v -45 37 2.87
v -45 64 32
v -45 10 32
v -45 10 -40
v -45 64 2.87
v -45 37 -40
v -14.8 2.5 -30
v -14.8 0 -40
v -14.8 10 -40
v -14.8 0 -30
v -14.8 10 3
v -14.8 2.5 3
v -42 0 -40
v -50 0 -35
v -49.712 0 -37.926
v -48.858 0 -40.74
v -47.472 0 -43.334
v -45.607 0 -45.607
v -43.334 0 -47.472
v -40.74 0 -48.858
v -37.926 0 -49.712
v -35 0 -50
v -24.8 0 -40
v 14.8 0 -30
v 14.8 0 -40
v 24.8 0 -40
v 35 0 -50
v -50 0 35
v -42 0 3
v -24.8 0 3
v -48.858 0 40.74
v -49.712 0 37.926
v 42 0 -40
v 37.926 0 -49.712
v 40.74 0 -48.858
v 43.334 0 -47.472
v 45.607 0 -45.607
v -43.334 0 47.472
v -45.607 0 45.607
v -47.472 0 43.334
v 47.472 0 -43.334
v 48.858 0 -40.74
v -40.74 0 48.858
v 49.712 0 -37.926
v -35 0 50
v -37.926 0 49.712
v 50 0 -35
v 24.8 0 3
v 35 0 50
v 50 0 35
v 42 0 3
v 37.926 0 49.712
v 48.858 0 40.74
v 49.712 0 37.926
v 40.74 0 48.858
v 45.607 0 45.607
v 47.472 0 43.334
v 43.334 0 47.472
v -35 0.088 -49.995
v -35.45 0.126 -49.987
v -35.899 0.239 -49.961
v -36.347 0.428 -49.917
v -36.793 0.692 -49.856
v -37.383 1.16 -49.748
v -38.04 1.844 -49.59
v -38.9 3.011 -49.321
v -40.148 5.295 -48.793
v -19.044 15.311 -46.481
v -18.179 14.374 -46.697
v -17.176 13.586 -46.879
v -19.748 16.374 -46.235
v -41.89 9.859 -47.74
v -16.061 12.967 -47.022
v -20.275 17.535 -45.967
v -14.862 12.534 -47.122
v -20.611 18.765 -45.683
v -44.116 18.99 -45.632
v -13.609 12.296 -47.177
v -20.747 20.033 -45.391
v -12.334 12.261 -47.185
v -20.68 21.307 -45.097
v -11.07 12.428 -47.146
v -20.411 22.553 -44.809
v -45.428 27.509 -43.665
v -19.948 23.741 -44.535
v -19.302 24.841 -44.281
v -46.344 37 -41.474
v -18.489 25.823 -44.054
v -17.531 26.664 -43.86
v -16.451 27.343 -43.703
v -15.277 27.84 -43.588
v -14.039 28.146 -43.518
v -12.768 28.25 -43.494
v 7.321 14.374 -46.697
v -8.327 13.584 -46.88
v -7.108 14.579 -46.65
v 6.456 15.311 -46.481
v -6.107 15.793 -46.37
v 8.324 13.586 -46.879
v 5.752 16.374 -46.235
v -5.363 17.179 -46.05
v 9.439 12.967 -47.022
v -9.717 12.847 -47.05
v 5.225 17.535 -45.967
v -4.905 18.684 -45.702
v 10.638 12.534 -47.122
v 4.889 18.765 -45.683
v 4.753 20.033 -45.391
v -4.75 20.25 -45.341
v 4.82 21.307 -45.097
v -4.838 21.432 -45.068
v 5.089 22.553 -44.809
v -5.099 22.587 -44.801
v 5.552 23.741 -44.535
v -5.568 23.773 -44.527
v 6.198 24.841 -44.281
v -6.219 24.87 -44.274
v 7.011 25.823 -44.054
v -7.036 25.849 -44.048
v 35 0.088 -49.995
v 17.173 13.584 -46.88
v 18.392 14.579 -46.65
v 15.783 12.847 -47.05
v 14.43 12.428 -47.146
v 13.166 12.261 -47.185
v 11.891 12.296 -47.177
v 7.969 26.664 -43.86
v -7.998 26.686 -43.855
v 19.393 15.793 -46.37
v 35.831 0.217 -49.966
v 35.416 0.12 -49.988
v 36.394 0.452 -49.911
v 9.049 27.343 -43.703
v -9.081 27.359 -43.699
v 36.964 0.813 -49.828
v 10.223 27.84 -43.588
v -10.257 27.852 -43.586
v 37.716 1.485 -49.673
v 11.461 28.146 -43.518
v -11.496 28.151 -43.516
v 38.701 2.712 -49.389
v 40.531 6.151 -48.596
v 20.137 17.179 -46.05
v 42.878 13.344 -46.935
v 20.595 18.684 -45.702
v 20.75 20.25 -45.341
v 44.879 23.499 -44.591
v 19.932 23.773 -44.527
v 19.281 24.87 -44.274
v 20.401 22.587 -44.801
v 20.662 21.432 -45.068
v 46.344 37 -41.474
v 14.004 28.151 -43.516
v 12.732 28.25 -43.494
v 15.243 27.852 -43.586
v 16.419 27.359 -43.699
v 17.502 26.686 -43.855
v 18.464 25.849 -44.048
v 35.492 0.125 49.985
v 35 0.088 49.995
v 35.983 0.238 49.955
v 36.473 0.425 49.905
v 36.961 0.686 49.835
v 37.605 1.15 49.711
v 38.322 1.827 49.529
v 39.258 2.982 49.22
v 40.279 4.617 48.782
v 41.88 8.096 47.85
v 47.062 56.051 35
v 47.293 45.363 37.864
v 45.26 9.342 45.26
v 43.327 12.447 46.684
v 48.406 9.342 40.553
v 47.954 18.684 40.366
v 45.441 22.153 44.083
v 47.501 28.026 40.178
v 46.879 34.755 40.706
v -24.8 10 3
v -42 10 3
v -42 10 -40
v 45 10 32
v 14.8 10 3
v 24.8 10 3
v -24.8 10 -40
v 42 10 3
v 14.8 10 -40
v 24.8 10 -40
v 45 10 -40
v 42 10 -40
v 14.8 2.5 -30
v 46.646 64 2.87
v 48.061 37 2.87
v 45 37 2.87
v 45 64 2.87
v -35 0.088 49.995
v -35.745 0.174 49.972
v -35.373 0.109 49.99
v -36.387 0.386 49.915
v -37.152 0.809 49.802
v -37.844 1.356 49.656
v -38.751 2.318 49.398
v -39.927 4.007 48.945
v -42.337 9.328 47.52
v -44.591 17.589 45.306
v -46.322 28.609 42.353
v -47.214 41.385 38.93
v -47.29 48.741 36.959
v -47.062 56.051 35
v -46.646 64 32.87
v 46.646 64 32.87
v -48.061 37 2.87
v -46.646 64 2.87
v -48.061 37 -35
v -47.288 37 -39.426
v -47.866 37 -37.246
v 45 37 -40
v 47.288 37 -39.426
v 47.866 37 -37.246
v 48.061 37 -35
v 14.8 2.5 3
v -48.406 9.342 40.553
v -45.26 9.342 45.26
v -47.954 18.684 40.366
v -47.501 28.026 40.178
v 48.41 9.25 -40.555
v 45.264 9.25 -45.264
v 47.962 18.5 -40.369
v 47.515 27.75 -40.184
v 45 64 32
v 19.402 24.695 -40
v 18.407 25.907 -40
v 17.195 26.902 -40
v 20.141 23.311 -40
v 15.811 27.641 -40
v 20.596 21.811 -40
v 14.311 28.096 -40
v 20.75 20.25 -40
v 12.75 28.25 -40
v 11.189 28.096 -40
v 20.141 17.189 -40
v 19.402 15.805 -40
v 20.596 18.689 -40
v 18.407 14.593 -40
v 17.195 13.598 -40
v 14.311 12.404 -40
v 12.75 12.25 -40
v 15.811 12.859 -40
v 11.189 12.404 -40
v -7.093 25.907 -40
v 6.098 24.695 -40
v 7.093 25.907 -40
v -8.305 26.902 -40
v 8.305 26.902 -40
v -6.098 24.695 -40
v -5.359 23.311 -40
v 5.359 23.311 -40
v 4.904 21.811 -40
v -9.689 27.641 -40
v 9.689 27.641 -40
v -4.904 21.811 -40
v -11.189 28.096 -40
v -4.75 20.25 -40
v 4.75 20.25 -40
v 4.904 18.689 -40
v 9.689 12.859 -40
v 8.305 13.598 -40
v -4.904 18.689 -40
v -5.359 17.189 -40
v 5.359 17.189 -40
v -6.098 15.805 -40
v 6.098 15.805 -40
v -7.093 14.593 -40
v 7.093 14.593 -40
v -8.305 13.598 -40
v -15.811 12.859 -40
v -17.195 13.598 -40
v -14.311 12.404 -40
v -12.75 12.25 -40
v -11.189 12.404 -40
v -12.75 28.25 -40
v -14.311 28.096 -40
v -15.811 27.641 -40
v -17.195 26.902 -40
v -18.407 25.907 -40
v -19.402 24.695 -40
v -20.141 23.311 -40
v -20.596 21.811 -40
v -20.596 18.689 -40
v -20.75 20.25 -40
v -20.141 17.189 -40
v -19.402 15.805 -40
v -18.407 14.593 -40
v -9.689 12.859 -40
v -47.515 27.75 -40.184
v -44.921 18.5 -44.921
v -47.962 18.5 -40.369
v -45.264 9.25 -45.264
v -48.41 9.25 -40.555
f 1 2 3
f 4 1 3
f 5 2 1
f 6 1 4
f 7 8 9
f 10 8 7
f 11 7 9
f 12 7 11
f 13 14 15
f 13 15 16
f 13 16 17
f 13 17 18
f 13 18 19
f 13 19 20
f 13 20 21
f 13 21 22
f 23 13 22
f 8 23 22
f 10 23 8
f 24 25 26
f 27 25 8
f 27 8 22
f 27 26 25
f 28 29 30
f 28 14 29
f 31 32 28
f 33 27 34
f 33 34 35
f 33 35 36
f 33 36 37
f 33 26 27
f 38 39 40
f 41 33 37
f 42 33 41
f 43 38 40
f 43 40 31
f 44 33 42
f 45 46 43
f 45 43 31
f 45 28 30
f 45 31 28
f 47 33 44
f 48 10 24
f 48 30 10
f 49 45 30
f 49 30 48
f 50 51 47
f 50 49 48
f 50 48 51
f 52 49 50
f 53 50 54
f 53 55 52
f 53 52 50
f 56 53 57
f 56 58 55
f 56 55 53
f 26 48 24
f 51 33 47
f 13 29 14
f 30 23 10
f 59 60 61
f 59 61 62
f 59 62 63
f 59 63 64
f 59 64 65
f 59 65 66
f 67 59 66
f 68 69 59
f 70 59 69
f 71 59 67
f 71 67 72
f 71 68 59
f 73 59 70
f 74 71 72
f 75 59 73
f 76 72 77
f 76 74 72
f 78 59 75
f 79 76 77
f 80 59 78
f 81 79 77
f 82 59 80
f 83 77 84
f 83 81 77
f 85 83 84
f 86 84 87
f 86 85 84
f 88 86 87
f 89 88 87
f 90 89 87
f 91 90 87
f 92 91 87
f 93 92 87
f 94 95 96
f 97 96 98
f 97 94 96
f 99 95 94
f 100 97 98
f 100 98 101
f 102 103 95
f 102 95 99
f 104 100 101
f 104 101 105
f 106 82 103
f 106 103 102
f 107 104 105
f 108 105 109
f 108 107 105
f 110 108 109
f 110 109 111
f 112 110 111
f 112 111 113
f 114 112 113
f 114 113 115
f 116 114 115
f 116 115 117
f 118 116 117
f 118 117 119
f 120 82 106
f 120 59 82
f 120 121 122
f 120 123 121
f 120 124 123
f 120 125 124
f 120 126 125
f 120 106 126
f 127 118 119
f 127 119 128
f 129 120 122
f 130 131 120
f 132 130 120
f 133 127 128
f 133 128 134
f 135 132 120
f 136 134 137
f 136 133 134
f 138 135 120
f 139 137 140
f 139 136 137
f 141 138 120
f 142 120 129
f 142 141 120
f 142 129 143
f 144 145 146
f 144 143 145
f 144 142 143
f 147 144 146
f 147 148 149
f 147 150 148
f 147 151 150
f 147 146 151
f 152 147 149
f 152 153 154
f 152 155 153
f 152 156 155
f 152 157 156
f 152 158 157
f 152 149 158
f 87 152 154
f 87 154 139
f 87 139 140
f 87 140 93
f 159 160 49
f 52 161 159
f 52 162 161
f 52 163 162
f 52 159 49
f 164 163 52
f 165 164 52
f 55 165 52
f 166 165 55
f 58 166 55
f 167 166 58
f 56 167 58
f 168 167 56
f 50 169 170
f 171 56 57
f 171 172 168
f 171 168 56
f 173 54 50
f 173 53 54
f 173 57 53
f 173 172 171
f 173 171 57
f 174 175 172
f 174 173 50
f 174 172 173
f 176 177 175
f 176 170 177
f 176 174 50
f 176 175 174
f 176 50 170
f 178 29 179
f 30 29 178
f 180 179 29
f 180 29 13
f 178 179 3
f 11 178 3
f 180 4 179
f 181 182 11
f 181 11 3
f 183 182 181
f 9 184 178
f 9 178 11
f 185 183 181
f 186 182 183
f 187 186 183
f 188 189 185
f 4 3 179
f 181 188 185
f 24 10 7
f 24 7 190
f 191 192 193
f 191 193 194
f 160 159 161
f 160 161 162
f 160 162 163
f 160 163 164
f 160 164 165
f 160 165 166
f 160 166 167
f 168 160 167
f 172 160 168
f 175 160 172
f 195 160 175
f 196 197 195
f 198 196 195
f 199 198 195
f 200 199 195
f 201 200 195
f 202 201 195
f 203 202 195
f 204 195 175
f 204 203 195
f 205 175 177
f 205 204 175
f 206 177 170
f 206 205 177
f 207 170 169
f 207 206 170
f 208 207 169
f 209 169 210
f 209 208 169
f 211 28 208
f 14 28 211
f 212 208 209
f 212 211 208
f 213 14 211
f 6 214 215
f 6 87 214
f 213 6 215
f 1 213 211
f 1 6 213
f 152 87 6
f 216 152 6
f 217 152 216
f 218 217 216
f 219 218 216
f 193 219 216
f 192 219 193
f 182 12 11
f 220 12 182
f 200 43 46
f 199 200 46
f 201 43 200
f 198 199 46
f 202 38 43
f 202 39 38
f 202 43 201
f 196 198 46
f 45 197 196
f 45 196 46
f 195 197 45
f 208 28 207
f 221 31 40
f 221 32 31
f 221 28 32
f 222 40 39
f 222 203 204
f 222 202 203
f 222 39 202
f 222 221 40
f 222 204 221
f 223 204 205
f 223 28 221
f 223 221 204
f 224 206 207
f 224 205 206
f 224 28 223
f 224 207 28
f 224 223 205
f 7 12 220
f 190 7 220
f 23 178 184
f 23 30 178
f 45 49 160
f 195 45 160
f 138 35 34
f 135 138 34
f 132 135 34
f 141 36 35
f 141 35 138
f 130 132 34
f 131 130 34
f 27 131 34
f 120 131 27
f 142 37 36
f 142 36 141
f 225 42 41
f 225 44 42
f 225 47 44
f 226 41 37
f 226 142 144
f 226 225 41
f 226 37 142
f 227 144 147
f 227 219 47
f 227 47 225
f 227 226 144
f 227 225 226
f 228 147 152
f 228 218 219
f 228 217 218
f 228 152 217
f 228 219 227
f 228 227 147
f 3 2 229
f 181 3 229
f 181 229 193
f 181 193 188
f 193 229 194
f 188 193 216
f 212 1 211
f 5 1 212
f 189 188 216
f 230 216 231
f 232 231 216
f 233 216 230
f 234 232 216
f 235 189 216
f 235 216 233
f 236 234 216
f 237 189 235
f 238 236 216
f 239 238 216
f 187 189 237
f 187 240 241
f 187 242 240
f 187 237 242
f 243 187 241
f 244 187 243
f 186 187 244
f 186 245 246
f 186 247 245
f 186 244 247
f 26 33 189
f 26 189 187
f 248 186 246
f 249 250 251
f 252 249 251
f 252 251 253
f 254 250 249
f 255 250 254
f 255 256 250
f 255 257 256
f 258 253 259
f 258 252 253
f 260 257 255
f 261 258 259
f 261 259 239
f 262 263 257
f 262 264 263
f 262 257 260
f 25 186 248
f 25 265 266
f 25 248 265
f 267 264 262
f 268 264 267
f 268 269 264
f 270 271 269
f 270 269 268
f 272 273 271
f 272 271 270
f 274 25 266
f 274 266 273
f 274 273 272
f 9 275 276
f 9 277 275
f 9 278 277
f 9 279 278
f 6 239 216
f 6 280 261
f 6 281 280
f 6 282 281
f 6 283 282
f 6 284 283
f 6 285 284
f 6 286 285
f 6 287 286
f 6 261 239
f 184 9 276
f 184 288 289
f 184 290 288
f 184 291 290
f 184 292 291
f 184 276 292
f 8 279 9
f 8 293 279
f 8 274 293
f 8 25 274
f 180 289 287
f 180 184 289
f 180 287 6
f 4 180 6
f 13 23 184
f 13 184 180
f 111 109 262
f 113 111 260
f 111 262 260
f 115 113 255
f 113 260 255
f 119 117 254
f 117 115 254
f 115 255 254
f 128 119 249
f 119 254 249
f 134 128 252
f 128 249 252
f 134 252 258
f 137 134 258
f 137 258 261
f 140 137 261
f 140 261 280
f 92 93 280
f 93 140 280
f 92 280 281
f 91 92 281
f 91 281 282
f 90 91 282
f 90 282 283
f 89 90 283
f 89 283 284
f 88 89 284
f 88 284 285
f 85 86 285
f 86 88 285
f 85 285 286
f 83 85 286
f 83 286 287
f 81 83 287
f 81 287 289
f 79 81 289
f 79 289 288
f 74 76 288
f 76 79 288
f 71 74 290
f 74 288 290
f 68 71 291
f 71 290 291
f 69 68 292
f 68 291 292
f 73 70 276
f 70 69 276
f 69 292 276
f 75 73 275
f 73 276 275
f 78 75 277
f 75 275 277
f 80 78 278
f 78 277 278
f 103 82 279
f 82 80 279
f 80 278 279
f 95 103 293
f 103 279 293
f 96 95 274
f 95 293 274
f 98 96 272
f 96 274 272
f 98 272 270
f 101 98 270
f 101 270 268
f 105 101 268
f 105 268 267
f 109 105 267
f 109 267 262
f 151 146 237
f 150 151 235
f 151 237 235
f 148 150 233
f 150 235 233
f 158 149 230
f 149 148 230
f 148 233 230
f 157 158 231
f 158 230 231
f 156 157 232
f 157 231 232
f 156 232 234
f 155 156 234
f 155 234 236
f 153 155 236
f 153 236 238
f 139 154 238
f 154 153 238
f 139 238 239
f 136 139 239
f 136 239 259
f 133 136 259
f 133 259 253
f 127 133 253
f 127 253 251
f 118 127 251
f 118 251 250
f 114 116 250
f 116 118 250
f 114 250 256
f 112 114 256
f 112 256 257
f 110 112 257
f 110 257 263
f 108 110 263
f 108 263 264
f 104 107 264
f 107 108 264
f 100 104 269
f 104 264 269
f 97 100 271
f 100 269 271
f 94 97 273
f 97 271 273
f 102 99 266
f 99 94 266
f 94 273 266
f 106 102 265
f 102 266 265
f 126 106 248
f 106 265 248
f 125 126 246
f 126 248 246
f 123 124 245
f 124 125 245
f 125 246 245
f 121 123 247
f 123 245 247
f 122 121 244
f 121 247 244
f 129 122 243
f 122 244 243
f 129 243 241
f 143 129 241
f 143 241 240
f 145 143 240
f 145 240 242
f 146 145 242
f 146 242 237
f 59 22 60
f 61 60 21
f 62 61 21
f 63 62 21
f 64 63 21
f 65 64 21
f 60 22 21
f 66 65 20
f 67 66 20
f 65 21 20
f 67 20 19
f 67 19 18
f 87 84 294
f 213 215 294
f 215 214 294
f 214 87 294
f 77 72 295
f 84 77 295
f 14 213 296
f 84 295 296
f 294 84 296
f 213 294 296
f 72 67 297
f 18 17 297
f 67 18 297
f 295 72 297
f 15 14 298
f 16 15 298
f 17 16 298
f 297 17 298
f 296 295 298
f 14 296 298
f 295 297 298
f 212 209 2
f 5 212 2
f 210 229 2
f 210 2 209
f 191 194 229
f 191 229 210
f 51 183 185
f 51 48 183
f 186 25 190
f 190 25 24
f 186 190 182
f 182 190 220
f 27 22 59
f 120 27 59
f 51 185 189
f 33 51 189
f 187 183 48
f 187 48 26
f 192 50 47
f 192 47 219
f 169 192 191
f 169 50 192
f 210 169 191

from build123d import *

# Parameters (mm, degrees)
BOSS_EXTRUDE1_DEPTH     = 10
SKETCH2_W               = 17.2
SKETCH2_H               = 43
CUT_EXTRUDE1_DEPTH      = 72.414284285
SKETCH3_W               = 90
SKETCH3_H               = 34
SKETCH3_W_2             = 80
SKETCH3_H_2             = 24
BOSS_EXTRUDE3_DEPTH     = 15
SKETCH4_W               = 49.6
SKETCH4_H               = 5
BOSS_EXTRUDE4_DEPTH     = 10
SKETCH5_W               = 15
SKETCH5_H               = 22
BOSS_EXTRUDE5_DEPTH     = 5
SKETCH6_W               = 90
SKETCH6_H               = 77
BOSS_EXTRUDE6_DEPTH     = 15
BOSS_EXTRUDE8_DEPTH     = 39
CHAMFER1_SIZE           = 64
CHAMFER1_SIZE_2         = 3.354097874
CHAMFER2_SIZE           = 64
CHAMFER2_SIZE_2         = 11.405813635
CHAMFER3_SIZE           = 64
CHAMFER3_SIZE_2         = 13.775745352
CUT_EXTRUDE3_DEPTH      = 95.500525601
CUT_EXTRUDE3_DEPTH_BACK = 95.500525601
SKETCH10_W              = 50
SKETCH10_H              = 27
SKETCH15_R              = 8
CUT_EXTRUDE5_DEPTH      = 122.227059686
CUT_EXTRUDE6_DEPTH      = 2.5
SKETCH18_W              = 29.6
SKETCH18_H              = 43
CUT_EXTRUDE7_DEPTH      = 10
CUT_EXTRUDE8_DEPTH      = 15
SKETCH21_W              = 29.6
SKETCH21_H              = 33
BOSS_EXTRUDE10_DEPTH    = 2.5
SKETCH23_W              = 2.05
SKETCH23_H              = 13
BOSS_EXTRUDE11_DEPTH    = 15
SKETCH24_W              = 90
SKETCH24_H              = 72
CUT_EXTRUDE9_DEPTH      = 54


with BuildPart() as part:
    # Sketch1 → Boss-Extrude1 (new body)
    with BuildSketch(Plane(origin=(0, 0, 0), x_dir=(1, 0, 0), z_dir=(0, 1, 0))):
        with BuildLine():
            Line((-35, 50), (35, 50))
            ThreePointArc((35, 50), (45.606601718, 45.606601718), (50, 35))
            Line((50, 35), (50, -35))
            ThreePointArc((50, -35), (45.606601718, -45.606601718), (35, -50))
            Line((35, -50), (-35, -50))
            ThreePointArc((-35, -50), (-45.606601718, -45.606601718), (-50, -35))
            Line((-50, -35), (-50, 35))
            ThreePointArc((-50, 35), (-45.606601718, 45.606601718), (-35, 50))
        make_face()
    extrude(amount=BOSS_EXTRUDE1_DEPTH)

    # Sketch2 → Cut-Extrude1 (cut, through all)
    with BuildSketch(Plane(origin=(0, 10, 0), x_dir=(1, 0, 0), z_dir=(0, 1, 0))):
        with Locations((-33.4, 18.5)):
            Rectangle(SKETCH2_W, SKETCH2_H)
        with Locations((33.4, 18.5)):
            Rectangle(SKETCH2_W, SKETCH2_H)
    extrude(amount=-CUT_EXTRUDE1_DEPTH, mode=Mode.SUBTRACT)

    # Sketch3 → Boss-Extrude3 (add)
    with BuildSketch(Plane(origin=(0, 10, 0), x_dir=(1, 0, 0), z_dir=(0, 1, 0))):
        with Locations((0, -20)):
            Rectangle(SKETCH3_W, SKETCH3_H)
        with Locations((0, -20)):
            Rectangle(SKETCH3_W_2, SKETCH3_H_2, mode=Mode.SUBTRACT)
    extrude(amount=BOSS_EXTRUDE3_DEPTH)

    # Sketch4 → Boss-Extrude4 (add)
    with BuildSketch(Plane(origin=(0, 10, 0), x_dir=(1, 0, 0), z_dir=(0, 1, 0))):
        with Locations((0, 10)):
            Rectangle(SKETCH4_W, SKETCH4_H)
        with Locations((0, 27)):
            Rectangle(SKETCH4_W, SKETCH4_H)
    extrude(amount=BOSS_EXTRUDE4_DEPTH)

    # Sketch5 → Boss-Extrude5 (add)
    with BuildSketch(Plane(origin=(0, 20, 0), x_dir=(1, 0, 0), z_dir=(0, 1, 0))):
        with Locations((-17.3, 18.5)):
            Rectangle(SKETCH5_W, SKETCH5_H)
        with Locations((17.3, 18.5)):
            Rectangle(SKETCH5_W, SKETCH5_H)
    extrude(amount=BOSS_EXTRUDE5_DEPTH)

    # Sketch6 → Boss-Extrude6 (add)
    with BuildSketch(Plane(origin=(0, 10, 0), x_dir=(1, 0, 0), z_dir=(0, 1, 0))):
        with BuildLine():
            Line((-50, 35), (-50, -35))
            ThreePointArc((-50, -35), (-45.606601718, -45.606601718), (-35, -50))
            Line((-35, -50), (35, -50))
            ThreePointArc((35, -50), (45.606601718, -45.606601718), (50, -35))
            Line((50, -35), (50, 35))
            ThreePointArc((50, 35), (45.606601718, 45.606601718), (35, 50))
            Line((35, 50), (-35, 50))
            ThreePointArc((-35, 50), (-45.606601718, 45.606601718), (-50, 35))
        make_face()
        with Locations((0, 1.5)):
            Rectangle(SKETCH6_W, SKETCH6_H, mode=Mode.SUBTRACT)
    extrude(amount=BOSS_EXTRUDE6_DEPTH)

    # Sketch9 → Boss-Extrude8 (add)
    with BuildSketch(Plane(origin=(0, 25, 0), x_dir=(1, 0, 0), z_dir=(0, 1, 0))):
        with BuildLine():
            Line((-50, 35), (-50, -35))
            ThreePointArc((-50, -35), (-45.606601718, -45.606601718), (-35, -50))
            Line((-35, -50), (35, -50))
            ThreePointArc((35, -50), (45.606601718, -45.606601718), (50, -35))
            Line((50, -35), (50, 35))
            ThreePointArc((50, 35), (45.606601718, 45.606601718), (35, 50))
            Line((35, 50), (-35, 50))
            ThreePointArc((-35, 50), (-45.606601718, 45.606601718), (-50, 35))
        make_face()
        with BuildLine():
            Line((-45, 35), (-45, -32))
            Line((-45, -32), (45, -32))
            Line((45, -32), (45, 35))
            ThreePointArc((45, 35), (44.659258263, 37.588190451), (43.660254038, 40))
            Line((43.660254038, 40), (-43.660254038, 40))
            ThreePointArc((-43.660254038, 40), (-44.659258263, 37.588190451), (-45, 35))
        make_face(mode=Mode.SUBTRACT)
    extrude(amount=BOSS_EXTRUDE8_DEPTH)

    # Chamfer1
    # the kernel refuses this chamfer: 64, 3.354097874 mm, written as the material it takes off along each edge
    with BuildSketch(Plane(origin=(-35, 64, 50), x_dir=(0, -0.9999979738662979, 0.002013023422382214), z_dir=(1, 0, 0)), Plane(origin=(50, 64, 35), x_dir=(0.002013023422382214, -0.9999979738662979, 0), z_dir=(0, 0, -1)), Plane(origin=(-50, 64, -35), x_dir=(-0.002013023422382214, -0.9999979738662979, 0), z_dir=(0, 0, 1)), Plane(origin=(35, 64, -50), x_dir=(0, -0.9999979738662979, -0.002013023422382214), z_dir=(-1, 0, 0))) as chamfer1_piece_1:
        Polygon((CHAMFER1_SIZE * 0.999997973866, CHAMFER1_SIZE * 0.00201302342238), (-CHAMFER1_SIZE_2 * 0.00201302342245, CHAMFER1_SIZE_2 * 0.9999979739), (0, 0), align=None)
    extrude(amount=70, mode=Mode.SUBTRACT)
    with BuildSketch(Plane(origin=(35, 64, 35), x_dir=(0, 0, 1), z_dir=(-1, 0, 0))) as chamfer1_piece_2:
        Polygon((15, -CHAMFER1_SIZE), (15 - CHAMFER1_SIZE_2, 0), (15, 0), align=None)
    revolve(axis=Axis((35, 64, 35), (0, 1, 0)), revolution_arc=90, mode=Mode.SUBTRACT)
    with BuildSketch(Plane(origin=(-35, 64, 35), x_dir=(-1, 0, 0), z_dir=(0, 0, -1))) as chamfer1_piece_3:
        Polygon((15, -CHAMFER1_SIZE), (15 - CHAMFER1_SIZE_2, 0), (15, 0), align=None)
    revolve(axis=Axis((-35, 64, 35), (0, 1, 0)), revolution_arc=90, mode=Mode.SUBTRACT)
    with BuildSketch(Plane(origin=(35, 64, -35), x_dir=(1, 0, 0), z_dir=(0, 0, 1))) as chamfer1_piece_4:
        Polygon((15, -CHAMFER1_SIZE), (15 - CHAMFER1_SIZE_2, 0), (15, 0), align=None)
    revolve(axis=Axis((35, 64, -35), (0, 1, 0)), revolution_arc=90, mode=Mode.SUBTRACT)
    with BuildSketch(Plane(origin=(-35, 64, -35), x_dir=(0, 0, -1), z_dir=(1, 0, 0))) as chamfer1_piece_5:
        Polygon((15 - CHAMFER1_SIZE_2, 0), (15, -CHAMFER1_SIZE), (15, 0), align=None)
    revolve(axis=Axis((-35, 64, -35), (0, 1, 0)), revolution_arc=90, mode=Mode.SUBTRACT)

    # Chamfer2
    # the kernel refuses this chamfer: 64, 11.405813635 mm, written as the material it takes off along each edge
    with BuildSketch(Plane(origin=(201.306482971, 64, -46.645902126), x_dir=(0, -0.9982575003065525, -0.05900816114499234), z_dir=(-1, 0, 0))) as chamfer2_piece_1:
        Polygon((CHAMFER2_SIZE * 0.999977671636, CHAMFER2_SIZE * 0.0066825316561), (-CHAMFER2_SIZE_2 * 0.0590081611462, CHAMFER2_SIZE_2 * 0.998257500326), (0, 0), align=None)
    extrude(amount=402.612965942, mode=Mode.SUBTRACT)

    # Chamfer3
    # the kernel refuses this chamfer: 64, 13.775745352 mm, written as the material it takes off along each edge
    with BuildSketch(Plane(origin=(-201.265469314, 64, 46.645902126), x_dir=(0, -0.9981787050157903, 0.06032638604292662), z_dir=(1, 0, 0))) as chamfer3_piece_1:
        Polygon((CHAMFER3_SIZE * 0.999967974892, CHAMFER3_SIZE * 0.00800307379952), (-CHAMFER3_SIZE_2 * 0.060326386045, CHAMFER3_SIZE_2 * 0.99817870505), (0, 0), align=None)
    extrude(amount=402.530938629, mode=Mode.SUBTRACT)

    # Sketch10 → Cut-Extrude3 (cut, two sides: drawn at the far end of the back side and taken through both)
    with BuildSketch(Plane(origin=(0, 1.307501734, 0), x_dir=(0, 0, 1), z_dir=(-1, 0, 0)).offset(-CUT_EXTRUDE3_DEPTH_BACK)):
        with Locations((-22.129843227, 49.192498266)):
            Rectangle(SKETCH10_W, SKETCH10_H)
    extrude(amount=CUT_EXTRUDE3_DEPTH + CUT_EXTRUDE3_DEPTH_BACK, mode=Mode.SUBTRACT)

    # Sketch15 → Cut-Extrude5 (cut, through all)
    with BuildSketch(Plane.XY.offset(-40)):
        with Locations((-12.75, 20.25)):
            Circle(SKETCH15_R)
        with Locations((12.75, 20.25)):
            Circle(SKETCH15_R)
    extrude(amount=-CUT_EXTRUDE5_DEPTH, mode=Mode.SUBTRACT)

    # Sketch17 → Cut-Extrude6 (cut)
    with BuildSketch(Plane(origin=(0, 0, -29.5), x_dir=(-1, 0, 0), z_dir=(0, 0, -1))):
        Polygon((-24.8, 10), (24.8, 10), (24.8, 25), (9.8, 25), (9.8, 20), (-9.8, 20), (-9.8, 25), (-24.8, 25), align=None)
    extrude(amount=-CUT_EXTRUDE6_DEPTH, mode=Mode.SUBTRACT)

    # Sketch18 → Cut-Extrude7 (cut)
    with BuildSketch(Plane.XZ):
        with Locations((0, -18.5)):
            Rectangle(SKETCH18_W, SKETCH18_H)
    extrude(amount=-CUT_EXTRUDE7_DEPTH, mode=Mode.SUBTRACT)

    # Sketch20 → Cut-Extrude8 (cut)
    with BuildSketch(Plane.XZ.offset(-25)):
        with BuildLine():
            Line((-45, -35), (-45, -40))
            Line((-45, -40), (-43.660254038, -40))
            ThreePointArc((-43.660254038, -40), (-44.659258263, -37.588190451), (-45, -35))
        make_face()
        with BuildLine():
            Line((45, -40), (45, -35))
            ThreePointArc((45, -35), (44.659258263, -37.588190451), (43.660254038, -40))
            Line((43.660254038, -40), (45, -40))
        make_face()
    extrude(amount=-CUT_EXTRUDE8_DEPTH, mode=Mode.SUBTRACT)

    # Sketch21 → Boss-Extrude10 (add)
    with BuildSketch(Plane.XZ):
        with Locations((0, -13.5)):
            Rectangle(SKETCH21_W, SKETCH21_H)
    extrude(amount=-BOSS_EXTRUDE10_DEPTH)

    # Sketch23 → Boss-Extrude11 (add)
    with BuildSketch(Plane(origin=(0, 10, 0), x_dir=(1, 0, 0), z_dir=(0, 1, 0))):
        with Locations((-23.775, 33.5)):
            Rectangle(SKETCH23_W, SKETCH23_H)
        with Locations((23.775, 33.5)):
            Rectangle(SKETCH23_W, SKETCH23_H)
    extrude(amount=BOSS_EXTRUDE11_DEPTH)

    # Sketch24 → Cut-Extrude9 (cut)
    with BuildSketch(Plane(origin=(0, 64, 0), x_dir=(1, 0, 0), z_dir=(0, 1, 0))):
        with Locations((0, 4)):
            Rectangle(SKETCH24_W, SKETCH24_H)
    extrude(amount=-CUT_EXTRUDE9_DEPTH, mode=Mode.SUBTRACT)


solid = part.part
